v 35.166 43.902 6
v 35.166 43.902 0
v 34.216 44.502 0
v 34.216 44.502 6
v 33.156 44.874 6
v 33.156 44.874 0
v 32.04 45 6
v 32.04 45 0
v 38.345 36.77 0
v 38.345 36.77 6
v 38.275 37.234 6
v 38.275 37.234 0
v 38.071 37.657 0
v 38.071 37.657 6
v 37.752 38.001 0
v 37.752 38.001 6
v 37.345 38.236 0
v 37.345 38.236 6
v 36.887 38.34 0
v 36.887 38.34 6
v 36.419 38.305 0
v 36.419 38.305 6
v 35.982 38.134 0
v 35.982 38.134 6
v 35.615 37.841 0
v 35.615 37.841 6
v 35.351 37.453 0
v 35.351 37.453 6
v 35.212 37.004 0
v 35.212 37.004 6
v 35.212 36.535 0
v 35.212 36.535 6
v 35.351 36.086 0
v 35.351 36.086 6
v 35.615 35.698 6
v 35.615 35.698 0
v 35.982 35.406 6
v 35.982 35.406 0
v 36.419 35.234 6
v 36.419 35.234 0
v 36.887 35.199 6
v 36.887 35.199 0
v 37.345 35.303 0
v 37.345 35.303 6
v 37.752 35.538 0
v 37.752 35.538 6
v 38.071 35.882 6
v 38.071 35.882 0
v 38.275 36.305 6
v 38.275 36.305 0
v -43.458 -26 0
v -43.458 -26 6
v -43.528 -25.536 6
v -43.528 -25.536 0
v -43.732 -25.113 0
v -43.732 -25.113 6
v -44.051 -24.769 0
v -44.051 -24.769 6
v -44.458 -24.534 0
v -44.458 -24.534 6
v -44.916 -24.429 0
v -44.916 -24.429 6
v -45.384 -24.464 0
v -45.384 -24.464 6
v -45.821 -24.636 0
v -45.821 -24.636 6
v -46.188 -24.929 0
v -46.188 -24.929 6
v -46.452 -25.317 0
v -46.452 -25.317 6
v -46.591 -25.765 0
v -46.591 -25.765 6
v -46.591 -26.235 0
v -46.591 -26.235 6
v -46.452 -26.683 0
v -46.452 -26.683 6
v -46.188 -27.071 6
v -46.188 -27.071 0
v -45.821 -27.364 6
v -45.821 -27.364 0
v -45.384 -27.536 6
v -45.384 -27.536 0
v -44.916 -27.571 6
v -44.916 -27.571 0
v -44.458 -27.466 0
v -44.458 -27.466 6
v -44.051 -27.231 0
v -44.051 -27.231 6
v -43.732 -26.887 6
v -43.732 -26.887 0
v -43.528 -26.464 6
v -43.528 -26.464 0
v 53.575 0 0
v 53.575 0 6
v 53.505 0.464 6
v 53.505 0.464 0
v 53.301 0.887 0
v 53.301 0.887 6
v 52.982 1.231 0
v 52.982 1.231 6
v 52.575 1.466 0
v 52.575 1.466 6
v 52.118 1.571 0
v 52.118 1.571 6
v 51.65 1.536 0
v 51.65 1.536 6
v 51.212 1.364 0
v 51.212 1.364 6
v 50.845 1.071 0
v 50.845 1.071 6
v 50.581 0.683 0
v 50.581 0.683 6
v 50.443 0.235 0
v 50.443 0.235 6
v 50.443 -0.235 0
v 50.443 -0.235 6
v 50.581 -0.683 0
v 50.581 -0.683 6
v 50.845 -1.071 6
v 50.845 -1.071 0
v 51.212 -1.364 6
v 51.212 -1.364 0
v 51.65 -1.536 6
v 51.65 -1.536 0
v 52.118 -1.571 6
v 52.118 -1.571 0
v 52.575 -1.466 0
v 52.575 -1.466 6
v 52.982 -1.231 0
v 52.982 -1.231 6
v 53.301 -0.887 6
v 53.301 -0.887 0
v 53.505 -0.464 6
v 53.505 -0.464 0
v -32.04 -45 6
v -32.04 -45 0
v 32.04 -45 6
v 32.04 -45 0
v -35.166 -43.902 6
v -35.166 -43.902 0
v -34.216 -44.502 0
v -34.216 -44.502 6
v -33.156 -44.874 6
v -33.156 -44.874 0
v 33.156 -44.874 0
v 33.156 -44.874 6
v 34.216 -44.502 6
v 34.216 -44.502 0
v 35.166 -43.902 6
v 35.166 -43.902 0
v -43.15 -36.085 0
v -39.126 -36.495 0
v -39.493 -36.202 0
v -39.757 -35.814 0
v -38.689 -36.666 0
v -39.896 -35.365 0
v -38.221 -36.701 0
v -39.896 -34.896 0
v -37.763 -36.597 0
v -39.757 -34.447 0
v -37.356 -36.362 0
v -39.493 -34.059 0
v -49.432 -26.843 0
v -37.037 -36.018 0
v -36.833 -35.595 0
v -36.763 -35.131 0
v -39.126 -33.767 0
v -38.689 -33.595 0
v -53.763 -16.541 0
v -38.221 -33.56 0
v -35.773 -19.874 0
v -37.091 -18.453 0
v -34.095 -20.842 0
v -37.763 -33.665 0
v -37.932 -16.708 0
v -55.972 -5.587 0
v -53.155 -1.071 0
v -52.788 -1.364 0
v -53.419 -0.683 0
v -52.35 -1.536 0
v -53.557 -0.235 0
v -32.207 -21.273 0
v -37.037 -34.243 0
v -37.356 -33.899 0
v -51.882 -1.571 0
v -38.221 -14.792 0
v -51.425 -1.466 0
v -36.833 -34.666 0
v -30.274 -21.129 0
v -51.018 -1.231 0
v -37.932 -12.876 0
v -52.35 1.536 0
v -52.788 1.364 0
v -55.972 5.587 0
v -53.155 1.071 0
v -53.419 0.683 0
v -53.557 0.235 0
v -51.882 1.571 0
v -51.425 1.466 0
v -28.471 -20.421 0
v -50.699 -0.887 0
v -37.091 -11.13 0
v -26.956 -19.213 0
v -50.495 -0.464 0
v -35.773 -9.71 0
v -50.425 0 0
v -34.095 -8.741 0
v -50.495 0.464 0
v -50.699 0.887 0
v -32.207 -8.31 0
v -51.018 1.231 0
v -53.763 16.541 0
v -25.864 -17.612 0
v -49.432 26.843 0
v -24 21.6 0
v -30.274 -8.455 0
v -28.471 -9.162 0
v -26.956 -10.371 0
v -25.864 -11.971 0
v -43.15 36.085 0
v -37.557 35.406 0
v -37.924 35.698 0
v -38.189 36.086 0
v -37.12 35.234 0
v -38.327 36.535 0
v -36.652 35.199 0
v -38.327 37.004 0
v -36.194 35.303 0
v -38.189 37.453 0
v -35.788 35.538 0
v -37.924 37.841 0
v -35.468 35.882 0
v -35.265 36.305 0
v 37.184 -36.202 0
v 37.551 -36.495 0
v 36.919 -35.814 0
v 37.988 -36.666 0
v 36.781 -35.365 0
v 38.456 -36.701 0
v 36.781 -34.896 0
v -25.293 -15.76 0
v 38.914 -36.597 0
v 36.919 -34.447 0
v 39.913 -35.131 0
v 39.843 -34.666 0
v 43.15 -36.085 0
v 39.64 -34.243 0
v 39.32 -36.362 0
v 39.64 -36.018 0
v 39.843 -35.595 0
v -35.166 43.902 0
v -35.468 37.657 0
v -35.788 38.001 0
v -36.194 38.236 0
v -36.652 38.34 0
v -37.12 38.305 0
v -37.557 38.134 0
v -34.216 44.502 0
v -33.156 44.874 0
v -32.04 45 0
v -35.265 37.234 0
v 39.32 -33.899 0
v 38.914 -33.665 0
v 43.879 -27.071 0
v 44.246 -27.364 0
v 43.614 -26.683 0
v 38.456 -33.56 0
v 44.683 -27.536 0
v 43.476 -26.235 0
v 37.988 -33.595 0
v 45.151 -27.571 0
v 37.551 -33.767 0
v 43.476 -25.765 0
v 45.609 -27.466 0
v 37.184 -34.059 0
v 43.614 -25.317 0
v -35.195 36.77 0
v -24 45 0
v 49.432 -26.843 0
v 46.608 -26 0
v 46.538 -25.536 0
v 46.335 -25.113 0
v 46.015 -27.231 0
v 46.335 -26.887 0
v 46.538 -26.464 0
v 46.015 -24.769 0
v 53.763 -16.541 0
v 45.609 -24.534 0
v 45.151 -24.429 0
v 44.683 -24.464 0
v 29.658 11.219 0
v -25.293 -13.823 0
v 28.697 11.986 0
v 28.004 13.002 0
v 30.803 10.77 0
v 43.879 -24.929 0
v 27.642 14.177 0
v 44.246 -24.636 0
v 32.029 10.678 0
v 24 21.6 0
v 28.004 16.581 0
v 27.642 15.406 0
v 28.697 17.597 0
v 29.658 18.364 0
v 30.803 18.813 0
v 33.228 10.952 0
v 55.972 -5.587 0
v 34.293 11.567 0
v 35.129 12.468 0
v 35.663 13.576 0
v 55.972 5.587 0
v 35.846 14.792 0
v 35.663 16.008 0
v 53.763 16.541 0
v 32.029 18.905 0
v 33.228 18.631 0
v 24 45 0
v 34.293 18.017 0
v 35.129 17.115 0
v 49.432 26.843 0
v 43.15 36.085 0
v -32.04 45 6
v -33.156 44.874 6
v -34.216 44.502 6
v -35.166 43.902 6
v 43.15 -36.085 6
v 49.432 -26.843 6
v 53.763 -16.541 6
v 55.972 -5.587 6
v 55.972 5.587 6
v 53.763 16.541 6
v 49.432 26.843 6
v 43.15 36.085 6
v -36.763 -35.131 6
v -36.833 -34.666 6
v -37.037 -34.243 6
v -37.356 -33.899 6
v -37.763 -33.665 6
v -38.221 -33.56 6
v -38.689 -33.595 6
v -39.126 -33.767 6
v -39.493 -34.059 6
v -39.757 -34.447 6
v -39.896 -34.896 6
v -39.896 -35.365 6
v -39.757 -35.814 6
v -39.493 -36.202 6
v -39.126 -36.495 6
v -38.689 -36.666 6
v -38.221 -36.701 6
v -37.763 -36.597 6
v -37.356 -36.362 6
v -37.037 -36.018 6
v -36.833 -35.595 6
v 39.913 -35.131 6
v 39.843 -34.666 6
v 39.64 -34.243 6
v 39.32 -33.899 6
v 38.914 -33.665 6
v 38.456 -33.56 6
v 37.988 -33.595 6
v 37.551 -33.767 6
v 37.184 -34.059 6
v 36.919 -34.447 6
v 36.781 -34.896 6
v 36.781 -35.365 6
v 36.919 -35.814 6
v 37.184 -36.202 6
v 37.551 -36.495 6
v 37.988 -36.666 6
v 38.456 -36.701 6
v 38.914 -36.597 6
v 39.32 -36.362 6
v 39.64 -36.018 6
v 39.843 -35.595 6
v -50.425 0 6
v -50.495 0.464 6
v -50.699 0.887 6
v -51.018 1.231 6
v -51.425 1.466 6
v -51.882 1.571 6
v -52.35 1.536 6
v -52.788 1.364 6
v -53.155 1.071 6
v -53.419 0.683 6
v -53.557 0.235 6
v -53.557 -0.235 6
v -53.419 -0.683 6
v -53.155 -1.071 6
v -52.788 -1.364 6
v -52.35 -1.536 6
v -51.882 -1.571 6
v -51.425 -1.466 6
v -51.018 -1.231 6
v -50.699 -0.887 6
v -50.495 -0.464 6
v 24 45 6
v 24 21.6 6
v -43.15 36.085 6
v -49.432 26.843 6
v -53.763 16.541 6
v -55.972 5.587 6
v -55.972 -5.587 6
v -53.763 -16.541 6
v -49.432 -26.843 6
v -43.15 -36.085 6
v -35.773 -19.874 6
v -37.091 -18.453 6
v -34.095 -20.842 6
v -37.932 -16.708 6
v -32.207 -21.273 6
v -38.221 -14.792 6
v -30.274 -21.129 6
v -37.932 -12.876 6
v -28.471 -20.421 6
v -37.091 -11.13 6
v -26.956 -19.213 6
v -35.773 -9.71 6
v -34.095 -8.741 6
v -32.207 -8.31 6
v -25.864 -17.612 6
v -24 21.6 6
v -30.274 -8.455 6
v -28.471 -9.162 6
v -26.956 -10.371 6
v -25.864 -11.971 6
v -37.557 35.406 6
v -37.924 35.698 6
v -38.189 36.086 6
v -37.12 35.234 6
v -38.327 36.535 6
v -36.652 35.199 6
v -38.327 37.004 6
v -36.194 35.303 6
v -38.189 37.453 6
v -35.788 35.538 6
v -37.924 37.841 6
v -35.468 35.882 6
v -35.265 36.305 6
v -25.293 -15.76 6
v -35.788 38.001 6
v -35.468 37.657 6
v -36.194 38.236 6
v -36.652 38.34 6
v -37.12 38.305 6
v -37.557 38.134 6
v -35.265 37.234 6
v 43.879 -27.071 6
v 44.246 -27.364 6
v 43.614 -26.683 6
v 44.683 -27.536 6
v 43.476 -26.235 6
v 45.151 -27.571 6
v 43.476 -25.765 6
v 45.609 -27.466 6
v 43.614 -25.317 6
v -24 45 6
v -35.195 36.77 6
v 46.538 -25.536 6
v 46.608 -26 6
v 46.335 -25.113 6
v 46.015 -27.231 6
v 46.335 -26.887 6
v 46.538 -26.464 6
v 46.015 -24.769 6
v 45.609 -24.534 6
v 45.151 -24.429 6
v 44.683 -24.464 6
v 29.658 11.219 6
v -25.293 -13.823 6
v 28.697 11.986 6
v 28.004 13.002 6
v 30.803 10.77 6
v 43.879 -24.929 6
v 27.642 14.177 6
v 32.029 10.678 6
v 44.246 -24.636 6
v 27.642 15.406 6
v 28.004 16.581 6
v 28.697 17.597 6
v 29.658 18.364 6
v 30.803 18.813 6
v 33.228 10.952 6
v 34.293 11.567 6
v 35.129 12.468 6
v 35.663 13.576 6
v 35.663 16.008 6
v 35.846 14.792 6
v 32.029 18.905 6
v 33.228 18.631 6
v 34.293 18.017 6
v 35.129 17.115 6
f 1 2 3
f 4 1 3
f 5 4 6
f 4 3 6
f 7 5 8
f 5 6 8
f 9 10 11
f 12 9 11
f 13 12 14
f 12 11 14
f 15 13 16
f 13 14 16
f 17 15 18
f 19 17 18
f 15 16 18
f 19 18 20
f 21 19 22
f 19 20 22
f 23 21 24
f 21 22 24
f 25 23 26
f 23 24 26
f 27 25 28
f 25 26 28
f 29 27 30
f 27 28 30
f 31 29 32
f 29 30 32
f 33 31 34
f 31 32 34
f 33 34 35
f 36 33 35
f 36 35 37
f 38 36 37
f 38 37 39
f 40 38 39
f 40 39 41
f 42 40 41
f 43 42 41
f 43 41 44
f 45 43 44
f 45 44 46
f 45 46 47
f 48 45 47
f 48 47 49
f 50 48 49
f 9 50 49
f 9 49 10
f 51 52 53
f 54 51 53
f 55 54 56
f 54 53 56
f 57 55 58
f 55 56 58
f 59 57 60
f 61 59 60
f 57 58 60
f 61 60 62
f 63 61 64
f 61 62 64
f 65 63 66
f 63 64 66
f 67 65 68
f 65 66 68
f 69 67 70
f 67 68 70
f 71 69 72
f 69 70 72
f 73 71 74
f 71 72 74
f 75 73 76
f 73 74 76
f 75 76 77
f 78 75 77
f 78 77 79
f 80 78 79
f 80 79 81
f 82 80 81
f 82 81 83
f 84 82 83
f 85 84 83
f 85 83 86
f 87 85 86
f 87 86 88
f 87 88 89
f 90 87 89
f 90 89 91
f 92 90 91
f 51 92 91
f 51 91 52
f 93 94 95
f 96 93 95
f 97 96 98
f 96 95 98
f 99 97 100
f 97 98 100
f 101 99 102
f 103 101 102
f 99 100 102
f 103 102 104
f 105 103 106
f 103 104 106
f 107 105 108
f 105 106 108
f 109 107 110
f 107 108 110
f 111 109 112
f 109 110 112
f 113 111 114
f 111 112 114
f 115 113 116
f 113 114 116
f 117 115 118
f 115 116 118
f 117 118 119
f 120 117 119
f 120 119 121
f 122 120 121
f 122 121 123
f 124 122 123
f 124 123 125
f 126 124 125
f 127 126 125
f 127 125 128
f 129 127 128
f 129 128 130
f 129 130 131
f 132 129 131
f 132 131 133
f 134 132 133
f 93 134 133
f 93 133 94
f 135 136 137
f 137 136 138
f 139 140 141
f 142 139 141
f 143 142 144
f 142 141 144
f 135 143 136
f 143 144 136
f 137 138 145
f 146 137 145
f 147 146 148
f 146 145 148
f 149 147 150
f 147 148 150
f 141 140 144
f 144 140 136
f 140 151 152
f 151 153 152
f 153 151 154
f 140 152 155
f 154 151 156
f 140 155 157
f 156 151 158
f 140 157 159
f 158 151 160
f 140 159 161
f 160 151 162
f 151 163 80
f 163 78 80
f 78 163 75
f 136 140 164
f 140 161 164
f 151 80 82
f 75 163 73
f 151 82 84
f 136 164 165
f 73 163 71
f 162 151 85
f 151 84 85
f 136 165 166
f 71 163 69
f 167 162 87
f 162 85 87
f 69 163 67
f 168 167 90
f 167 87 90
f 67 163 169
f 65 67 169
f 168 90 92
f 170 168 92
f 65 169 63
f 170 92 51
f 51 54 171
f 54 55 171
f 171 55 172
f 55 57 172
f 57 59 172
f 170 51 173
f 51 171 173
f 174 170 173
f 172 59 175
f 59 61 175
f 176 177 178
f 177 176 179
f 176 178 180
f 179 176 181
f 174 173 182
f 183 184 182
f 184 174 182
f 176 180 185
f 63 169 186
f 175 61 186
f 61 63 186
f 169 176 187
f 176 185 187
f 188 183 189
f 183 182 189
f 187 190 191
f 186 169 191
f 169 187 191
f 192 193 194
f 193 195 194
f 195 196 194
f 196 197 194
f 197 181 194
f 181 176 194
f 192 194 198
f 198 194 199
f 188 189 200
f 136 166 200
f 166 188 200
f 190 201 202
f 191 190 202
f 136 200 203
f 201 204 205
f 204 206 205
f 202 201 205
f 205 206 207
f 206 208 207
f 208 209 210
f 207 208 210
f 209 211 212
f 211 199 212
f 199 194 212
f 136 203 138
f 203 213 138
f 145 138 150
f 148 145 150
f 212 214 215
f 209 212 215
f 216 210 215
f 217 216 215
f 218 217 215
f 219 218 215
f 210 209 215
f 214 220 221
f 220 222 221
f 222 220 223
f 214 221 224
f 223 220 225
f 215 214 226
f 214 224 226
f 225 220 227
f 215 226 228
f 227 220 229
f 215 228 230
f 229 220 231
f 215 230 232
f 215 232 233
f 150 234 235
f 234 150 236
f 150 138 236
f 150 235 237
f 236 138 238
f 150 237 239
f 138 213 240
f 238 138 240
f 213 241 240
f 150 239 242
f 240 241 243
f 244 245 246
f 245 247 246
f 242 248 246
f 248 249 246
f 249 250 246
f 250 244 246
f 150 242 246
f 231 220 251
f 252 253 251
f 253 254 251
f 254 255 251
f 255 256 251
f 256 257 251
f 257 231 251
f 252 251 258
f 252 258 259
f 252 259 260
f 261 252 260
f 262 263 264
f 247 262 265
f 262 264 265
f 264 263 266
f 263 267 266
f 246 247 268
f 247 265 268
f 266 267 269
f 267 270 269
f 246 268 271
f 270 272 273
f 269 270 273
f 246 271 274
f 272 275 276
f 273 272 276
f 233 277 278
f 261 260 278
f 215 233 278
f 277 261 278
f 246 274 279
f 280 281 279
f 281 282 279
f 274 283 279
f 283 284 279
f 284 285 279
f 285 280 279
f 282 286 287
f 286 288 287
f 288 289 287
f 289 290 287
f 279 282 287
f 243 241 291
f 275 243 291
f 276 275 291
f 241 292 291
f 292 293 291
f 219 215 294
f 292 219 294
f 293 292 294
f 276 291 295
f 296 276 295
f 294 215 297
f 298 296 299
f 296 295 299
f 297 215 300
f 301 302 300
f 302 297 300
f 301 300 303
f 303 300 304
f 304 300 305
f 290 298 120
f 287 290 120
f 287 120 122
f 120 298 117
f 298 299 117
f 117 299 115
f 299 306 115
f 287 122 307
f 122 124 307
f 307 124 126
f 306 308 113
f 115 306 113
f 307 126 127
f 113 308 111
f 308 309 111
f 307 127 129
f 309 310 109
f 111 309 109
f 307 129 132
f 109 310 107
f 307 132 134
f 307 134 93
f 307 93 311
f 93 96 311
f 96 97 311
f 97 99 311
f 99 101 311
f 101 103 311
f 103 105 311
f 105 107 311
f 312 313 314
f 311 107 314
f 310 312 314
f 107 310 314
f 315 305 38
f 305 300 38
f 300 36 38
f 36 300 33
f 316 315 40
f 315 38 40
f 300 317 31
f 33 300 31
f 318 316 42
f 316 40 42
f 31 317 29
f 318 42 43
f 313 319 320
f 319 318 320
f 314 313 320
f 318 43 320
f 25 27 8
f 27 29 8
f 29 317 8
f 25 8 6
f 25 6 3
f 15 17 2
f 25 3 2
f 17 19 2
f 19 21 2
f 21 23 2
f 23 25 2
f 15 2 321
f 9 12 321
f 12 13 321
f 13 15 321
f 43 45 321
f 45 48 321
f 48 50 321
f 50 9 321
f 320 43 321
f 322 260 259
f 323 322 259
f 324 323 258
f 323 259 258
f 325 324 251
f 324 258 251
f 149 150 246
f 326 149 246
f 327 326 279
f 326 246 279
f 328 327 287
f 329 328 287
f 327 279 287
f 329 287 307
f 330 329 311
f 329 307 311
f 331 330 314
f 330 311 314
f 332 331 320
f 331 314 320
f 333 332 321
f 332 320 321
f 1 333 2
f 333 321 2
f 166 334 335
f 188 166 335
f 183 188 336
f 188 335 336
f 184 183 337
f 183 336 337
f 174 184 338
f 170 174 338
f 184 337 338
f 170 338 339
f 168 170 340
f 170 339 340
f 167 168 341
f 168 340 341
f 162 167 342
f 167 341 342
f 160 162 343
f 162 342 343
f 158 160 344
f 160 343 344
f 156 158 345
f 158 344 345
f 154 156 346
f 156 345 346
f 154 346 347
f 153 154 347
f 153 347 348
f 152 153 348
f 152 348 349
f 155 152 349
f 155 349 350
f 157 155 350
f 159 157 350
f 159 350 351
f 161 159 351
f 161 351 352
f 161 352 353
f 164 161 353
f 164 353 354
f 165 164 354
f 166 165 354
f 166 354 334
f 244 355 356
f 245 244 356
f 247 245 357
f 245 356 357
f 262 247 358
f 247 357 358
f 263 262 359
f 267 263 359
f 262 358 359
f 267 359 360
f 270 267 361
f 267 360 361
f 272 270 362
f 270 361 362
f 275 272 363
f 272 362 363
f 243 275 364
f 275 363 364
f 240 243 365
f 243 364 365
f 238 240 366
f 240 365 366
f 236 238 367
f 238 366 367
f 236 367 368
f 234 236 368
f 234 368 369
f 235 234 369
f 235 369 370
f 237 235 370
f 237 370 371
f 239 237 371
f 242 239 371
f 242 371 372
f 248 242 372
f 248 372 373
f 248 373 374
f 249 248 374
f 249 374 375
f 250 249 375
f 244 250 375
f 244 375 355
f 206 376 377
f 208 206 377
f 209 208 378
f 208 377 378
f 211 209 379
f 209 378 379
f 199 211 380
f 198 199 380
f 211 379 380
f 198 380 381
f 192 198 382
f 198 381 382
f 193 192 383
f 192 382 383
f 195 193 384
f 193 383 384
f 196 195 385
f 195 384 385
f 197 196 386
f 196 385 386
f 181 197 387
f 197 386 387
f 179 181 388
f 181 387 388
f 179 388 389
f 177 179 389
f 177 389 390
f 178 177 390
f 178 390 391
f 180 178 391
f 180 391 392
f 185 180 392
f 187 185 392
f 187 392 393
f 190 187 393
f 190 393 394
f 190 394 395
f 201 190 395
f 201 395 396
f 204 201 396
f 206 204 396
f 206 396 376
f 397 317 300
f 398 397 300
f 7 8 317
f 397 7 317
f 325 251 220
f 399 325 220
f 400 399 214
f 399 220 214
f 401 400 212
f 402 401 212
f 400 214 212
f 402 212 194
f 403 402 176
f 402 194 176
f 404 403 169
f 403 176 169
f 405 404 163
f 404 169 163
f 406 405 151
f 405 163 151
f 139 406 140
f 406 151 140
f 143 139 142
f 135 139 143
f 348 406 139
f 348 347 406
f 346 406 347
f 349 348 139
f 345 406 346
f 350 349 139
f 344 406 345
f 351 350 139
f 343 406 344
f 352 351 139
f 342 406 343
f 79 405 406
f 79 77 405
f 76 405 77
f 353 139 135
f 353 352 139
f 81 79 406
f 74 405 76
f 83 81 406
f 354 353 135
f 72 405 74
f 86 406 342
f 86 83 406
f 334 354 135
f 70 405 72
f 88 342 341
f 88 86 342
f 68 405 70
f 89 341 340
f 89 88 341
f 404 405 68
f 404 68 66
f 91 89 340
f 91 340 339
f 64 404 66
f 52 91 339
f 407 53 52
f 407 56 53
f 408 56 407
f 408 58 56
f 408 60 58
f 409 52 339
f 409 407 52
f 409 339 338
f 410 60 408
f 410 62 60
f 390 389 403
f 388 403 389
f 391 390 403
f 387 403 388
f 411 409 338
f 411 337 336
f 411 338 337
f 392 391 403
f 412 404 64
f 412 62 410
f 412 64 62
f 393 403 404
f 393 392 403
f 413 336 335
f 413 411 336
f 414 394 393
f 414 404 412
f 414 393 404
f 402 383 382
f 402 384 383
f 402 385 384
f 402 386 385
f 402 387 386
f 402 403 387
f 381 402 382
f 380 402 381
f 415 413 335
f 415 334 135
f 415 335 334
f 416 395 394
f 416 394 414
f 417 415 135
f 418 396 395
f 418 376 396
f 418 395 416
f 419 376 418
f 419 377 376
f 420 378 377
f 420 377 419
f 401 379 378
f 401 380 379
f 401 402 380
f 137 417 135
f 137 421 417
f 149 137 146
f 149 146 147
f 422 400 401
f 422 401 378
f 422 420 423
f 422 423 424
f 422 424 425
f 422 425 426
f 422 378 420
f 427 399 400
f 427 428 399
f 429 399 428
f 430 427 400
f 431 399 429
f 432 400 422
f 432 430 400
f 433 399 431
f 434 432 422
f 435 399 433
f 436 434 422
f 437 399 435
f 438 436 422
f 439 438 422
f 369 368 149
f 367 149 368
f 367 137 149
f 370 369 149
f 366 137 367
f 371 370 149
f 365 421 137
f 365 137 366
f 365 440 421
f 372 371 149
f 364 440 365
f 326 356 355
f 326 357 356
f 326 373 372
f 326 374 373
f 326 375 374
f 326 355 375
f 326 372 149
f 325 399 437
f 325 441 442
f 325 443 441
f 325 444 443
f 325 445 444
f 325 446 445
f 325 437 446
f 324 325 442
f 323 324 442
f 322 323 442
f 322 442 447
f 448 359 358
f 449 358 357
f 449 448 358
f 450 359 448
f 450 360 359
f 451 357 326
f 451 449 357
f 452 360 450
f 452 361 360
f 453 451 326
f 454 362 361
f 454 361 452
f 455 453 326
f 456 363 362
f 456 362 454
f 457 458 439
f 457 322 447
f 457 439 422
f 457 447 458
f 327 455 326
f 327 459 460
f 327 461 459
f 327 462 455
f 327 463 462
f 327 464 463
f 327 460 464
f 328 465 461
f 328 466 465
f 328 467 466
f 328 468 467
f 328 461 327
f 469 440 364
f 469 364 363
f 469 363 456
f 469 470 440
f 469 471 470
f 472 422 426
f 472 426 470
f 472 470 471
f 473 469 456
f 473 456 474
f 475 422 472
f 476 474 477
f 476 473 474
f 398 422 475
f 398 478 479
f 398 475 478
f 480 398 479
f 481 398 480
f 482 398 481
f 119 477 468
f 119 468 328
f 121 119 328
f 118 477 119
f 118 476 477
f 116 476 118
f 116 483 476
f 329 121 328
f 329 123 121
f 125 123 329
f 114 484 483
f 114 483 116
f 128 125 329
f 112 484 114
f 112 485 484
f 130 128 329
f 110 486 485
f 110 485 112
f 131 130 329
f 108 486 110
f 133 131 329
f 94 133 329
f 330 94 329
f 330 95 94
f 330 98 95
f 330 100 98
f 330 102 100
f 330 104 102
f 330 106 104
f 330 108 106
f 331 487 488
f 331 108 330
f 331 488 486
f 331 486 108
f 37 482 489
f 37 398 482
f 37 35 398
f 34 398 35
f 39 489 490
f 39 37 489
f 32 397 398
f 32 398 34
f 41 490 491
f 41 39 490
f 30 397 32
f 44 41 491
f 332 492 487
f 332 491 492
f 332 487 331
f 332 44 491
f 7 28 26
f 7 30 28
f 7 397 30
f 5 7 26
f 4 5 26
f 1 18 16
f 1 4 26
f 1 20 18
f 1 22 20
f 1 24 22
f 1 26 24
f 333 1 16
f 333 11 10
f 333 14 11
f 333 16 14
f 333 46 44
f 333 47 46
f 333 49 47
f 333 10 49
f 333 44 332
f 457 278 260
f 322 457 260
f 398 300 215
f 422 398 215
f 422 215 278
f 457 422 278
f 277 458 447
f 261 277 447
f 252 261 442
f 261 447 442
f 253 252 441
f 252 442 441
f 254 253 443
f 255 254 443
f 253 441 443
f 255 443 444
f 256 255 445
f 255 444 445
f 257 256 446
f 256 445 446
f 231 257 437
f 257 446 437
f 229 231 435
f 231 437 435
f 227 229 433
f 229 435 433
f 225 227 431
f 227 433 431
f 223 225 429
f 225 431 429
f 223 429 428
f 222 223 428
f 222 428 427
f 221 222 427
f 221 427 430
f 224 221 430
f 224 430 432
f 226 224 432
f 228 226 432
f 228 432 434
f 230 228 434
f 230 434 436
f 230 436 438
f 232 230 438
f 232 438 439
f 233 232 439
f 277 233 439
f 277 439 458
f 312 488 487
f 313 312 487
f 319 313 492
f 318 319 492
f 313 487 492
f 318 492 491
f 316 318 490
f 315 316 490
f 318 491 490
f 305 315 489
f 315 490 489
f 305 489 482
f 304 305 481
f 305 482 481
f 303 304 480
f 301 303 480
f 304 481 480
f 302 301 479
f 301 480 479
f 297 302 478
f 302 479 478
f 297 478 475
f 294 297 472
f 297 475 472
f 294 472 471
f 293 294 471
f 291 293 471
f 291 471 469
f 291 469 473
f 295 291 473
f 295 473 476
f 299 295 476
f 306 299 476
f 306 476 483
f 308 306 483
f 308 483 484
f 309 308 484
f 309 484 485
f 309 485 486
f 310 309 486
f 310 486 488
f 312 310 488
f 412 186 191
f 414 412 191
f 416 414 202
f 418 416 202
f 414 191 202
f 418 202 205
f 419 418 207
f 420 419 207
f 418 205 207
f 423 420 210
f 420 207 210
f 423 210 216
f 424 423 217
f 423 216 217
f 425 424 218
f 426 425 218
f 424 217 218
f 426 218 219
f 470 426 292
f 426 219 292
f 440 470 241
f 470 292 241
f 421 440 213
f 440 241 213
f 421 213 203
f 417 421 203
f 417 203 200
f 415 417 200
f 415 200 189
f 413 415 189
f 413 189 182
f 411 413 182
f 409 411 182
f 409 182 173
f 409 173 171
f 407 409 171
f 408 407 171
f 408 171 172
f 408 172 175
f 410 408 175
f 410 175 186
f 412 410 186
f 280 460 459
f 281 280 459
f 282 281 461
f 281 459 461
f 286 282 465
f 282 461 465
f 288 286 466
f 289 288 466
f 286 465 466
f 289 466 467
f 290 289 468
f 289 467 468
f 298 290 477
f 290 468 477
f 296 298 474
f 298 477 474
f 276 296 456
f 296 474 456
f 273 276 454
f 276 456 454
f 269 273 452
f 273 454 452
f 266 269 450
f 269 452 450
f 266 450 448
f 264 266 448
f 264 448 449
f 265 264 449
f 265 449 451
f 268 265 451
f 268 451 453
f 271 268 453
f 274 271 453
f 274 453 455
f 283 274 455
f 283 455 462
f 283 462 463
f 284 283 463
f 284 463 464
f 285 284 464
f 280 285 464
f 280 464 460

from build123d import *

# Parameters (mm, degrees)
Y_KSEKLIK_EKSTR_ZYON1_DEPTH             = 6
M3X0_5_HELISARMAL_IN_DI_LI_DELIK1_D     = 3.15
M3X0_5_HELISARMAL_IN_DI_LI_DELIK1_DEPTH = 7.5
M3X0_5_HELISARMAL_IN_DI_LI_DELIK1_TIP   = 0.946355475
M8X1_0_HELISARMAL_IN_DI_LI_DELIK2_D     = 8.25
M8X1_0_HELISARMAL_IN_DI_LI_DELIK2_DEPTH = 18
M8X1_0_HELISARMAL_IN_DI_LI_DELIK2_TIP   = 2.478550053
IZIM7_R                                 = 6.5
KES_EKSTR_ZYON1_DEPTH                   = 10


with BuildPart() as part:
    # Çizim1 → Yükseklik-Ekstrüzyon1 (new body)
    with BuildSketch(Plane.XY):
        with BuildLine():
            Line((32.040014045, 45), (24, 45))
            Line((24, 45), (24, 21.6))
            Line((24, 21.6), (-24, 21.6))
            Line((-24, 21.6), (-24, 45))
            Line((-24, 45), (-32.040014045, 45))
            ThreePointArc((-32.040014045, 45), (-33.696486936, 44.717636862), (-35.165869074, 43.902439024))
            ThreePointArc((-35.165869074, 43.902439024), (-56.25, 0), (-35.165869074, -43.902439024))
            ThreePointArc((-35.165869074, -43.902439024), (-33.696486936, -44.717636862), (-32.040014045, -45))
            Line((-32.040014045, -45), (32.040014045, -45))
            ThreePointArc((32.040014045, -45), (33.696486936, -44.717636862), (35.165869074, -43.902439024))
            ThreePointArc((35.165869074, -43.902439024), (56.25, 0), (35.165869074, 43.902439024))
            ThreePointArc((35.165869074, 43.902439024), (33.696486936, 44.717636862), (32.040014045, 45))
        make_face()
    extrude(amount=Y_KSEKLIK_EKSTR_ZYON1_DEPTH)

    # M3x0.5 Helisarmal İçin Dişli Delik1
    with Locations(Plane(origin=(0, 0, 0), x_dir=(-1, 0, 0), z_dir=(0, 0, -1))):
        with Locations((38.338421514, -35.130690796), (52, 0), (-52, 0), (-36.769552622, 36.769552622), (-45.033320997, -26), (36.769552622, 36.769552622), (45.033320997, -26), (-38.338421514, -35.130690796)):
            Hole(M3X0_5_HELISARMAL_IN_DI_LI_DELIK1_D / 2, depth=M3X0_5_HELISARMAL_IN_DI_LI_DELIK1_DEPTH)
            with Locations((0, 0, -(M3X0_5_HELISARMAL_IN_DI_LI_DELIK1_DEPTH + M3X0_5_HELISARMAL_IN_DI_LI_DELIK1_TIP / 2))):  # 118° drill point
                Cone(0, M3X0_5_HELISARMAL_IN_DI_LI_DELIK1_D / 2, M3X0_5_HELISARMAL_IN_DI_LI_DELIK1_TIP, mode=Mode.SUBTRACT)

    # M8x1.0 Helisarmal İçin Dişli Delik2
    with Locations(Plane(origin=(0, 0, 0), x_dir=(-1, 0, 0), z_dir=(0, 0, -1))):
        with Locations((-31.720772546, 14.791639161)):
            Hole(M8X1_0_HELISARMAL_IN_DI_LI_DELIK2_D / 2, depth=M8X1_0_HELISARMAL_IN_DI_LI_DELIK2_DEPTH)
            with Locations((0, 0, -(M8X1_0_HELISARMAL_IN_DI_LI_DELIK2_DEPTH + M8X1_0_HELISARMAL_IN_DI_LI_DELIK2_TIP / 2))):  # 118° drill point
                Cone(0, M8X1_0_HELISARMAL_IN_DI_LI_DELIK2_D / 2, M8X1_0_HELISARMAL_IN_DI_LI_DELIK2_TIP, mode=Mode.SUBTRACT)

    # Çizim7 → Kes-Ekstrüzyon1 (cut)
    with BuildSketch(Plane(origin=(0, 0, 0), x_dir=(-1, 0, 0), z_dir=(0, 0, -1))):
        with Locations((31.720772546, -14.791639161)):
            Circle(IZIM7_R)
    extrude(amount=-KES_EKSTR_ZYON1_DEPTH, mode=Mode.SUBTRACT)


solid = part.part
